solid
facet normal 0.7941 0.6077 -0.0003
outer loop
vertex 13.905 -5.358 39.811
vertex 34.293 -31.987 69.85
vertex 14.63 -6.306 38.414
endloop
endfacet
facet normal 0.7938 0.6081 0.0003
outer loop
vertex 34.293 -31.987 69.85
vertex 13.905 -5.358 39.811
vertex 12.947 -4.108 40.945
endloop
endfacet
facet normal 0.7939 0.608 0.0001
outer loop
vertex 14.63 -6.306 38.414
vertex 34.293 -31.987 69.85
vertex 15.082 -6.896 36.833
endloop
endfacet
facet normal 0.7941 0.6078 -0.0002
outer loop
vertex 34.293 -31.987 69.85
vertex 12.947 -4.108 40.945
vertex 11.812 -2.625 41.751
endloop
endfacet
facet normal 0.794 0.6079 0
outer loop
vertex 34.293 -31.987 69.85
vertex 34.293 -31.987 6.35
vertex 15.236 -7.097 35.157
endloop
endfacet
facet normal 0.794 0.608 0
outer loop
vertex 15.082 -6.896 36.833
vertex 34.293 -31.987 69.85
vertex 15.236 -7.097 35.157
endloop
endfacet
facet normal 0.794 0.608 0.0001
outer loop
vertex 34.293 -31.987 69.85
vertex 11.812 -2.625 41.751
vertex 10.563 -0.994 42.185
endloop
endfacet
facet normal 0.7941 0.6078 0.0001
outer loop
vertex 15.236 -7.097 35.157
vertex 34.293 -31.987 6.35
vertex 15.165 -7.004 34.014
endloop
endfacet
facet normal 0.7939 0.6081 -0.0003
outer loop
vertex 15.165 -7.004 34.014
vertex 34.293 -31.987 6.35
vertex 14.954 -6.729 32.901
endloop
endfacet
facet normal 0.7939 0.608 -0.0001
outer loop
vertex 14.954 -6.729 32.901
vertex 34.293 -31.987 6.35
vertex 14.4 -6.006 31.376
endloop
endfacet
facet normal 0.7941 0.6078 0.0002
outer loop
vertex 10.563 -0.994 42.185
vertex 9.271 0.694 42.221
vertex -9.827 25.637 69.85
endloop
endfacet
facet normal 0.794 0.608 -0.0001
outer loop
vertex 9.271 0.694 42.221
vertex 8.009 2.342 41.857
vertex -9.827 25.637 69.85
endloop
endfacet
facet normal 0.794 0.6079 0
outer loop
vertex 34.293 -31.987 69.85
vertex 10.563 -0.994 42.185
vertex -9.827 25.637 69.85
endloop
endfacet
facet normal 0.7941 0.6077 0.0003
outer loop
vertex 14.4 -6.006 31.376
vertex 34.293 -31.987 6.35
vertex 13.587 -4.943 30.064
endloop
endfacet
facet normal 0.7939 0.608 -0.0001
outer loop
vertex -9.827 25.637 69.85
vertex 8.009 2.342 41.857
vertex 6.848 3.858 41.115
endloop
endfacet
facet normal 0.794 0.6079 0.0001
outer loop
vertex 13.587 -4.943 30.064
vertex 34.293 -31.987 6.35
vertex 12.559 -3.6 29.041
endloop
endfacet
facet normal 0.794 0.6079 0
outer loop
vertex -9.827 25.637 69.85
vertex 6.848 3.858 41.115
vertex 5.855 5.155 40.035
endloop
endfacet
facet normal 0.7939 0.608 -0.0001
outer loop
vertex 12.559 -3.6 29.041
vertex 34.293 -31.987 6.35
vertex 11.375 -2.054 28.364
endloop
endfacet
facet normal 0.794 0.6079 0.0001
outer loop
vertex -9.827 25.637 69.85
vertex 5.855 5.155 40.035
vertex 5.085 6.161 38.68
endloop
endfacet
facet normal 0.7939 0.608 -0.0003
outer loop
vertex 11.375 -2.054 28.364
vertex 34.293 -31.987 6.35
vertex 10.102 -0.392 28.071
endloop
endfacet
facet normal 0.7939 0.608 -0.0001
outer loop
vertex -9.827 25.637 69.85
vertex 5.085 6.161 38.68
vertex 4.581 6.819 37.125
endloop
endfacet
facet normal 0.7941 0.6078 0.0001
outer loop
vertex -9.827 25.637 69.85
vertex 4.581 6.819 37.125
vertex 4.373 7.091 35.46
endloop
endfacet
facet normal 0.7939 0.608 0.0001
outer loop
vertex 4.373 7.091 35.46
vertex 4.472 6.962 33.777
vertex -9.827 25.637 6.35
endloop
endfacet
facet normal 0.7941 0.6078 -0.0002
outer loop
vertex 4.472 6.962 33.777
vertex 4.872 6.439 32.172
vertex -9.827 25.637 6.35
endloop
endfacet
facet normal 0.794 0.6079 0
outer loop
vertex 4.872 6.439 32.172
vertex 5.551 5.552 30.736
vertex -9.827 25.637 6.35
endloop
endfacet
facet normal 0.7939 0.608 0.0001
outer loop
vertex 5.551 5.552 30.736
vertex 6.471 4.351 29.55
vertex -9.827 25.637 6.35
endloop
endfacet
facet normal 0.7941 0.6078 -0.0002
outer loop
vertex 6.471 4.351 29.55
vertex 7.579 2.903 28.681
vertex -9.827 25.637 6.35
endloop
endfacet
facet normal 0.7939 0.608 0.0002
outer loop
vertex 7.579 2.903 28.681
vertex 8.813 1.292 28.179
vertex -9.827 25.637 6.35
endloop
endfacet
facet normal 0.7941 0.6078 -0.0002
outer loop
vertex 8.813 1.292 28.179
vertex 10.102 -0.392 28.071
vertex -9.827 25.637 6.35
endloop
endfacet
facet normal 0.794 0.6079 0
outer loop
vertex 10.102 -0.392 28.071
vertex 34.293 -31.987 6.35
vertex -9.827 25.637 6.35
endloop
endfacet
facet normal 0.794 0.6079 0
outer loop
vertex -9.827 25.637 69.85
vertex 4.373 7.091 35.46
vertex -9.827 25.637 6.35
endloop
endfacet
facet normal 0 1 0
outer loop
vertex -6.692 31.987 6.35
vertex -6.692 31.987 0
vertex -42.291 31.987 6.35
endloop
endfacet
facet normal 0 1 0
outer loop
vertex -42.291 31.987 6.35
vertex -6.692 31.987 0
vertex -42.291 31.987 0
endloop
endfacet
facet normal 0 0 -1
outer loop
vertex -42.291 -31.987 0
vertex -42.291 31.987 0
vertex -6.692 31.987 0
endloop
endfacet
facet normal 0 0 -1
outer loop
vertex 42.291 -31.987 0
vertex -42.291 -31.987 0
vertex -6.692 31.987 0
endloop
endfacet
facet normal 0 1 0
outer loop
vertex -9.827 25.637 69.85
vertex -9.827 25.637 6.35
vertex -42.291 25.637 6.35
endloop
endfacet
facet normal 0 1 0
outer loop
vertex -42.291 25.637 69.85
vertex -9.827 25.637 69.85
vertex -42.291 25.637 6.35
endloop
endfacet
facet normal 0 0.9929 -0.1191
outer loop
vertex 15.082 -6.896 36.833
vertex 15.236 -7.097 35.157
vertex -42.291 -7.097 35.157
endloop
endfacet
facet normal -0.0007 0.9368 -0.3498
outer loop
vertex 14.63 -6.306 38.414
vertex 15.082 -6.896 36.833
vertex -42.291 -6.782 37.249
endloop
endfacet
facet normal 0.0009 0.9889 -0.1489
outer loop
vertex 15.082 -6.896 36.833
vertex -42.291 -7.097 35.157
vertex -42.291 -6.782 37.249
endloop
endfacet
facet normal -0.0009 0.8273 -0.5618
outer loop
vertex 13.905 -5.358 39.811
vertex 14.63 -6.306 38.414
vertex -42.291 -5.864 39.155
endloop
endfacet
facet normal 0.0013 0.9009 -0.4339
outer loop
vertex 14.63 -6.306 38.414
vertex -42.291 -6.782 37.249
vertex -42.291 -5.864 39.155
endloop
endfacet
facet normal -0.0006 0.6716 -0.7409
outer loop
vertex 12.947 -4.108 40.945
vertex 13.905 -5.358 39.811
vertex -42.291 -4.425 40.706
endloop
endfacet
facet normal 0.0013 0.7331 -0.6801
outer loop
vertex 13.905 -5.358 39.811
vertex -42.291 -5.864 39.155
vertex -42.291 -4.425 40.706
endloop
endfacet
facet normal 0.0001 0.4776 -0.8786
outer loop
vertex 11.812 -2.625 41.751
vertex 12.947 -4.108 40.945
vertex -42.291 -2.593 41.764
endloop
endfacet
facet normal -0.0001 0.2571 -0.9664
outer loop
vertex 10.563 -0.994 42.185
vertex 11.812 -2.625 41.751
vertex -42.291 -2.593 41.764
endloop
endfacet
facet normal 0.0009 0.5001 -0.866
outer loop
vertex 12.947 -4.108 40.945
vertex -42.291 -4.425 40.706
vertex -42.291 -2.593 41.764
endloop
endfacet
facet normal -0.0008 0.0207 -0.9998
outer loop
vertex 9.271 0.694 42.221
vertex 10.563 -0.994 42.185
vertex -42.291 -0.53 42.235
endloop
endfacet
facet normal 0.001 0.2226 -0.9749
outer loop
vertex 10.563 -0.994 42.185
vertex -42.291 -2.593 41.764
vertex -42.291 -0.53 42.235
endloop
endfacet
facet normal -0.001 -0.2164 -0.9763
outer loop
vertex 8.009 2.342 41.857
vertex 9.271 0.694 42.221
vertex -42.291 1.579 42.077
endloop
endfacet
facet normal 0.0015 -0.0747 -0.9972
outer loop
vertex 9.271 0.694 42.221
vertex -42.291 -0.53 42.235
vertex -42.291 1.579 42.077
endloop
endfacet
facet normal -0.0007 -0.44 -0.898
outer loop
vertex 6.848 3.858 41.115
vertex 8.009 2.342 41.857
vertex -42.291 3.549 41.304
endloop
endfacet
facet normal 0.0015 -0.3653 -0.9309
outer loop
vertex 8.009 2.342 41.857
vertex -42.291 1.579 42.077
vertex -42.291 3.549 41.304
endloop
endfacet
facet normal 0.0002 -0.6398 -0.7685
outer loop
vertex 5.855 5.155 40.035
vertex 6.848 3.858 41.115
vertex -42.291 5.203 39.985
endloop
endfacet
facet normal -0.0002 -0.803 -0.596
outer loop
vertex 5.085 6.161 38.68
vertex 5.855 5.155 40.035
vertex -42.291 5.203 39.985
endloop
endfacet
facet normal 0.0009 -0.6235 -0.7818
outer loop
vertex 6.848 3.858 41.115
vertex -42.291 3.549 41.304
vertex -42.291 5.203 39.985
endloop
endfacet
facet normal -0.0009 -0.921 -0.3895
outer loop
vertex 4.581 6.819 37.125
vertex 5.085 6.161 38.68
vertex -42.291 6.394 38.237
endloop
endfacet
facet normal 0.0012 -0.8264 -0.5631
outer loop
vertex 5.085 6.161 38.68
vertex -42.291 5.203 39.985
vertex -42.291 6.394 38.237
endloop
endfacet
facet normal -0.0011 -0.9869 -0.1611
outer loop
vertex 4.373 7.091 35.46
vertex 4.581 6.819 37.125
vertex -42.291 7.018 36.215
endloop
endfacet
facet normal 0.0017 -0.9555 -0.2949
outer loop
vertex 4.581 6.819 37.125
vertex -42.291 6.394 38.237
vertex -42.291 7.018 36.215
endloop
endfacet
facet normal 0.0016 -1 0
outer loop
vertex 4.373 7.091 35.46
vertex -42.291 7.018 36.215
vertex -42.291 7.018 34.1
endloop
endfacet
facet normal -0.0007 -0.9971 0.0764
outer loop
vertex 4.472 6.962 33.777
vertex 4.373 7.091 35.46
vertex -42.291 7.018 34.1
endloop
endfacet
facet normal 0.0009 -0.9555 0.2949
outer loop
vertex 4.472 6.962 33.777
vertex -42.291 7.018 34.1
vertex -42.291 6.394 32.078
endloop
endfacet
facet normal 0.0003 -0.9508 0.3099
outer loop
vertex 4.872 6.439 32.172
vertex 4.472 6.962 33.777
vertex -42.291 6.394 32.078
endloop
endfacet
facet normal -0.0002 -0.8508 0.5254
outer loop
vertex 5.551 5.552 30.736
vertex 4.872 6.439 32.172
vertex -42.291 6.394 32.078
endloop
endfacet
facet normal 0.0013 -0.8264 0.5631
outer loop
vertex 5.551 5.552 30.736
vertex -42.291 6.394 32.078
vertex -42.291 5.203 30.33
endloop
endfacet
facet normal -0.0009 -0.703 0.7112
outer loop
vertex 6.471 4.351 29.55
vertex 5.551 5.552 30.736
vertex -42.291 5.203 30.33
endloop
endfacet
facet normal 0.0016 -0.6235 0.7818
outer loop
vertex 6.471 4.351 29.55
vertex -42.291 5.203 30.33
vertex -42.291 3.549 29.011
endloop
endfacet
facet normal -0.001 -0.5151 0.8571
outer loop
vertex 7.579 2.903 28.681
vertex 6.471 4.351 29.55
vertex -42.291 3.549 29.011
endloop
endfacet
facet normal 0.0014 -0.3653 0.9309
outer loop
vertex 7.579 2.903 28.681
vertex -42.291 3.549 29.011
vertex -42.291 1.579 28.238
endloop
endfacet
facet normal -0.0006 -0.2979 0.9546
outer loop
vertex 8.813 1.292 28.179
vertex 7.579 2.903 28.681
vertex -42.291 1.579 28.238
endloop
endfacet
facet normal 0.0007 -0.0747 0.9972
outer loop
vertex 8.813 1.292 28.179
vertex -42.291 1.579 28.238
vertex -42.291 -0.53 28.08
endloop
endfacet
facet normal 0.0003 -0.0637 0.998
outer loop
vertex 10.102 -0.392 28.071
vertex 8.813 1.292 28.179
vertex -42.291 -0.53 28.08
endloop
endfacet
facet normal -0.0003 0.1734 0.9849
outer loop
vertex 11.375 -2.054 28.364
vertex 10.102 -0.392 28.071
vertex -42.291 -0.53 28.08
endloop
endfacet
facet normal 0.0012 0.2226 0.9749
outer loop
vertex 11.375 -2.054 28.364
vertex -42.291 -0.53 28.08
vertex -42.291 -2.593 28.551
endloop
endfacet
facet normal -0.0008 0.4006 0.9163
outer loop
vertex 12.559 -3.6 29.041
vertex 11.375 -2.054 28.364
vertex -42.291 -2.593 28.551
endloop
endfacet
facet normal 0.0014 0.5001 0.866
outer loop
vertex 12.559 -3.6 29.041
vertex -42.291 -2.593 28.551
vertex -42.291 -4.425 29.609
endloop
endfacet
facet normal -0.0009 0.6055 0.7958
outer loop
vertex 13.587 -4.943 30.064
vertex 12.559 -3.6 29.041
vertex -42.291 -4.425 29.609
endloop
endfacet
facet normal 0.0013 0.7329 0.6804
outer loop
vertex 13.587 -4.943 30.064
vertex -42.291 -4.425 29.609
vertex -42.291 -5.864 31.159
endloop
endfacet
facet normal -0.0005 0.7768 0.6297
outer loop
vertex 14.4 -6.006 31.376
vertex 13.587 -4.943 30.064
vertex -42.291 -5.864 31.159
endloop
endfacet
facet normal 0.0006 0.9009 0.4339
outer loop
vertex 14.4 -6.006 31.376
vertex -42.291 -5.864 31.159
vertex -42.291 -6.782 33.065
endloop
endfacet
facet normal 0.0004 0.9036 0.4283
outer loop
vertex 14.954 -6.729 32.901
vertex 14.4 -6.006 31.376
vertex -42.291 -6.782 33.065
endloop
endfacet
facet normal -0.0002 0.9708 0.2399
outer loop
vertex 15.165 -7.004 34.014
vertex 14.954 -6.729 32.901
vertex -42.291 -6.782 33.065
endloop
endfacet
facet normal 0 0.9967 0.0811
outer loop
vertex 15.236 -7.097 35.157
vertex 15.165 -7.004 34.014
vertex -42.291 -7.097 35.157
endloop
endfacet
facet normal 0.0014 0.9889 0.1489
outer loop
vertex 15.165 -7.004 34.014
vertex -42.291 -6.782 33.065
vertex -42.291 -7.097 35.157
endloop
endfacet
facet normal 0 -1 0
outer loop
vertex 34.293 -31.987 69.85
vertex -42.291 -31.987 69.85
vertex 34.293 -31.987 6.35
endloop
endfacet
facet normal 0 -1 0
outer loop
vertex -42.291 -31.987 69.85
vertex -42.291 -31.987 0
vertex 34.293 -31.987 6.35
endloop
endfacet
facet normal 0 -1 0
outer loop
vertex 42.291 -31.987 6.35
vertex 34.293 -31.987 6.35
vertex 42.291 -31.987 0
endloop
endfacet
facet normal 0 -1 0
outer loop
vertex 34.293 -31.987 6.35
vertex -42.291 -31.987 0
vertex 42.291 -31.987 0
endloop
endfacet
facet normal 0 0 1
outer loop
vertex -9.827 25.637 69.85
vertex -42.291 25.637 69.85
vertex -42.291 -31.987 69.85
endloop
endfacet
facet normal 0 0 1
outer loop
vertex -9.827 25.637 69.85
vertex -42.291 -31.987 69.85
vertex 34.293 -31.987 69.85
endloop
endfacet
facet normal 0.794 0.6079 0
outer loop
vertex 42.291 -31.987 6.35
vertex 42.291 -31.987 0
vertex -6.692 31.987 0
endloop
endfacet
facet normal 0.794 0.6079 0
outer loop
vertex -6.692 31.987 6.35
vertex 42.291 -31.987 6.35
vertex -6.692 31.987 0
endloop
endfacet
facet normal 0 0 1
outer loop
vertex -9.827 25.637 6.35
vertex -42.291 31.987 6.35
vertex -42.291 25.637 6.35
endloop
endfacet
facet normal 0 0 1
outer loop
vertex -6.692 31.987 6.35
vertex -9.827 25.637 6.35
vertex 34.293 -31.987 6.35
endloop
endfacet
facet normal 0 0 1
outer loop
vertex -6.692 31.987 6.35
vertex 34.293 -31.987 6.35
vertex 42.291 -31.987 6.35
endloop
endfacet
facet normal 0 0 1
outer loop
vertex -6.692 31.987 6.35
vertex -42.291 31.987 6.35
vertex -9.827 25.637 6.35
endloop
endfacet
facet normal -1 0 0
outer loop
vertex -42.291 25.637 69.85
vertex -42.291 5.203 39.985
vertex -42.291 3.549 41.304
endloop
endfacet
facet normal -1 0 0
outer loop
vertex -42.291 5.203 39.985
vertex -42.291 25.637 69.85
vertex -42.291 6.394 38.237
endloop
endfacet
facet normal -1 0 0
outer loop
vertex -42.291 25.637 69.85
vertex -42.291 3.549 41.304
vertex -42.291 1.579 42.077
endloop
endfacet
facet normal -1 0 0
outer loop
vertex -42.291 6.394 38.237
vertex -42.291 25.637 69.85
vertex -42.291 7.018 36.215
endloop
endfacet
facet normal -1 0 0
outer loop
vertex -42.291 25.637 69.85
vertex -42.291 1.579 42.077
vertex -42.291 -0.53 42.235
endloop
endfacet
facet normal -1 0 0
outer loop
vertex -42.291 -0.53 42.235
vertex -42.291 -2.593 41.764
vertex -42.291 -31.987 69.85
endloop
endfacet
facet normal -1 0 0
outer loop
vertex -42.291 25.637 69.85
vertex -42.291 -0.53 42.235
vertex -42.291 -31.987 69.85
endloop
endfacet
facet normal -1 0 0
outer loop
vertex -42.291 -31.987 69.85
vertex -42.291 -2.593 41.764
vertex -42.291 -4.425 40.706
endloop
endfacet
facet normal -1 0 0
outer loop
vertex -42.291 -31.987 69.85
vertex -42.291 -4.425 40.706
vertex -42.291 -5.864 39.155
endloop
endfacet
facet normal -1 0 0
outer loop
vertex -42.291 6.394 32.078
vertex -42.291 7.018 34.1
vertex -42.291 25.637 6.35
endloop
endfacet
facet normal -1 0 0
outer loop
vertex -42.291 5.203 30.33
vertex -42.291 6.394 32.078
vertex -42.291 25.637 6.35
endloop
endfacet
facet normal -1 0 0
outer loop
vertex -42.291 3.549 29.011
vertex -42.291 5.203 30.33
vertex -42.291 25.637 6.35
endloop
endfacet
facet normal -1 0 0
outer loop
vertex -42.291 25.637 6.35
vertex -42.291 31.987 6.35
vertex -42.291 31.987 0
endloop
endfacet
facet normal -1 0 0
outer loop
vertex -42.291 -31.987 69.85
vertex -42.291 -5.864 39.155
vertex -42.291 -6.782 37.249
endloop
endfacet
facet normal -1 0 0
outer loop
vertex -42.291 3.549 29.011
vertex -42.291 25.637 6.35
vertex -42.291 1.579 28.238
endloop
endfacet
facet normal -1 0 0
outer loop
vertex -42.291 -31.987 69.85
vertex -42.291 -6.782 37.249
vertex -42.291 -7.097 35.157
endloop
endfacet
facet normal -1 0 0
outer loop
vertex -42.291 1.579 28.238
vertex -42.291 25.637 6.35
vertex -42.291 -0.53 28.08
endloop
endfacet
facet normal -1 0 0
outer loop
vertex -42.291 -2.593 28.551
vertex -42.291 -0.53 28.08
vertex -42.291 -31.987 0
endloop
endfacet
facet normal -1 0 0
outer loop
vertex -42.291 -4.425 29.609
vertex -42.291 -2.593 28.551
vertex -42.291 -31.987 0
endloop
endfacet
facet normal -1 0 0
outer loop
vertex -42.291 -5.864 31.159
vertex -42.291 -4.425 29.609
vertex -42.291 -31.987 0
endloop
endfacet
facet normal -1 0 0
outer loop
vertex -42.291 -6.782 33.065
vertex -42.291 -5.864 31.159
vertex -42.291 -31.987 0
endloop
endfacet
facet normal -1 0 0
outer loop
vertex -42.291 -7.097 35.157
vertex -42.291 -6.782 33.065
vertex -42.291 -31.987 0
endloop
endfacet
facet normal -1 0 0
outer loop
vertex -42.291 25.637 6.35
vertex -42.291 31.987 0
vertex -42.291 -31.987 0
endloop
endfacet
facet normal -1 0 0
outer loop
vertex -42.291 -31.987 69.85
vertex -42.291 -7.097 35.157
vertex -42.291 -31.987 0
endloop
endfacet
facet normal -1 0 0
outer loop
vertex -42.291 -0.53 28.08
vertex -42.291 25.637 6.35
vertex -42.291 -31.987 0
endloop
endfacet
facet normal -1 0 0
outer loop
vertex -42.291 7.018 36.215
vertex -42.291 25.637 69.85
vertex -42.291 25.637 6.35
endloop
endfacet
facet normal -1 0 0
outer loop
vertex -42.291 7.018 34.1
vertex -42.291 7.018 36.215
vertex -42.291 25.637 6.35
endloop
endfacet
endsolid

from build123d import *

# Parameters (mm, degrees)
F1_DEPTH = 6.35
F3_DEPTH = 63.5
F4_R     = 7.097159
F5_DEPTH = 159.004


with BuildPart() as f1:
    # F0 (on Top) → F1 (new body)
    with BuildSketch(Plane.XY):
        Polygon((-6.691513, 31.987395), (-42.290725, 31.987395), (-42.290725, -31.987395), (42.290725, -31.987395), align=None)
    extrude(amount=F1_DEPTH)

    # F2 (on face) → F3 (join)
    with BuildSketch(Plane.XY.offset(6.35)):
        Polygon((-9.82716, 25.637395), (-42.290725, 25.637395), (-42.290725, -31.987395), (34.293207, -31.987395), align=None)
    extrude(amount=F3_DEPTH)

    # F4 (on face) → F5 (cut)
    with BuildSketch(Plane(origin=(-42.290725, 0, 0), x_dir=(0, -1, 0), z_dir=(-1, 0, 0))):
        with Locations((0, 35.157394)):
            Circle(F4_R)
    extrude(amount=-F5_DEPTH, mode=Mode.SUBTRACT)


solid = f1.part
